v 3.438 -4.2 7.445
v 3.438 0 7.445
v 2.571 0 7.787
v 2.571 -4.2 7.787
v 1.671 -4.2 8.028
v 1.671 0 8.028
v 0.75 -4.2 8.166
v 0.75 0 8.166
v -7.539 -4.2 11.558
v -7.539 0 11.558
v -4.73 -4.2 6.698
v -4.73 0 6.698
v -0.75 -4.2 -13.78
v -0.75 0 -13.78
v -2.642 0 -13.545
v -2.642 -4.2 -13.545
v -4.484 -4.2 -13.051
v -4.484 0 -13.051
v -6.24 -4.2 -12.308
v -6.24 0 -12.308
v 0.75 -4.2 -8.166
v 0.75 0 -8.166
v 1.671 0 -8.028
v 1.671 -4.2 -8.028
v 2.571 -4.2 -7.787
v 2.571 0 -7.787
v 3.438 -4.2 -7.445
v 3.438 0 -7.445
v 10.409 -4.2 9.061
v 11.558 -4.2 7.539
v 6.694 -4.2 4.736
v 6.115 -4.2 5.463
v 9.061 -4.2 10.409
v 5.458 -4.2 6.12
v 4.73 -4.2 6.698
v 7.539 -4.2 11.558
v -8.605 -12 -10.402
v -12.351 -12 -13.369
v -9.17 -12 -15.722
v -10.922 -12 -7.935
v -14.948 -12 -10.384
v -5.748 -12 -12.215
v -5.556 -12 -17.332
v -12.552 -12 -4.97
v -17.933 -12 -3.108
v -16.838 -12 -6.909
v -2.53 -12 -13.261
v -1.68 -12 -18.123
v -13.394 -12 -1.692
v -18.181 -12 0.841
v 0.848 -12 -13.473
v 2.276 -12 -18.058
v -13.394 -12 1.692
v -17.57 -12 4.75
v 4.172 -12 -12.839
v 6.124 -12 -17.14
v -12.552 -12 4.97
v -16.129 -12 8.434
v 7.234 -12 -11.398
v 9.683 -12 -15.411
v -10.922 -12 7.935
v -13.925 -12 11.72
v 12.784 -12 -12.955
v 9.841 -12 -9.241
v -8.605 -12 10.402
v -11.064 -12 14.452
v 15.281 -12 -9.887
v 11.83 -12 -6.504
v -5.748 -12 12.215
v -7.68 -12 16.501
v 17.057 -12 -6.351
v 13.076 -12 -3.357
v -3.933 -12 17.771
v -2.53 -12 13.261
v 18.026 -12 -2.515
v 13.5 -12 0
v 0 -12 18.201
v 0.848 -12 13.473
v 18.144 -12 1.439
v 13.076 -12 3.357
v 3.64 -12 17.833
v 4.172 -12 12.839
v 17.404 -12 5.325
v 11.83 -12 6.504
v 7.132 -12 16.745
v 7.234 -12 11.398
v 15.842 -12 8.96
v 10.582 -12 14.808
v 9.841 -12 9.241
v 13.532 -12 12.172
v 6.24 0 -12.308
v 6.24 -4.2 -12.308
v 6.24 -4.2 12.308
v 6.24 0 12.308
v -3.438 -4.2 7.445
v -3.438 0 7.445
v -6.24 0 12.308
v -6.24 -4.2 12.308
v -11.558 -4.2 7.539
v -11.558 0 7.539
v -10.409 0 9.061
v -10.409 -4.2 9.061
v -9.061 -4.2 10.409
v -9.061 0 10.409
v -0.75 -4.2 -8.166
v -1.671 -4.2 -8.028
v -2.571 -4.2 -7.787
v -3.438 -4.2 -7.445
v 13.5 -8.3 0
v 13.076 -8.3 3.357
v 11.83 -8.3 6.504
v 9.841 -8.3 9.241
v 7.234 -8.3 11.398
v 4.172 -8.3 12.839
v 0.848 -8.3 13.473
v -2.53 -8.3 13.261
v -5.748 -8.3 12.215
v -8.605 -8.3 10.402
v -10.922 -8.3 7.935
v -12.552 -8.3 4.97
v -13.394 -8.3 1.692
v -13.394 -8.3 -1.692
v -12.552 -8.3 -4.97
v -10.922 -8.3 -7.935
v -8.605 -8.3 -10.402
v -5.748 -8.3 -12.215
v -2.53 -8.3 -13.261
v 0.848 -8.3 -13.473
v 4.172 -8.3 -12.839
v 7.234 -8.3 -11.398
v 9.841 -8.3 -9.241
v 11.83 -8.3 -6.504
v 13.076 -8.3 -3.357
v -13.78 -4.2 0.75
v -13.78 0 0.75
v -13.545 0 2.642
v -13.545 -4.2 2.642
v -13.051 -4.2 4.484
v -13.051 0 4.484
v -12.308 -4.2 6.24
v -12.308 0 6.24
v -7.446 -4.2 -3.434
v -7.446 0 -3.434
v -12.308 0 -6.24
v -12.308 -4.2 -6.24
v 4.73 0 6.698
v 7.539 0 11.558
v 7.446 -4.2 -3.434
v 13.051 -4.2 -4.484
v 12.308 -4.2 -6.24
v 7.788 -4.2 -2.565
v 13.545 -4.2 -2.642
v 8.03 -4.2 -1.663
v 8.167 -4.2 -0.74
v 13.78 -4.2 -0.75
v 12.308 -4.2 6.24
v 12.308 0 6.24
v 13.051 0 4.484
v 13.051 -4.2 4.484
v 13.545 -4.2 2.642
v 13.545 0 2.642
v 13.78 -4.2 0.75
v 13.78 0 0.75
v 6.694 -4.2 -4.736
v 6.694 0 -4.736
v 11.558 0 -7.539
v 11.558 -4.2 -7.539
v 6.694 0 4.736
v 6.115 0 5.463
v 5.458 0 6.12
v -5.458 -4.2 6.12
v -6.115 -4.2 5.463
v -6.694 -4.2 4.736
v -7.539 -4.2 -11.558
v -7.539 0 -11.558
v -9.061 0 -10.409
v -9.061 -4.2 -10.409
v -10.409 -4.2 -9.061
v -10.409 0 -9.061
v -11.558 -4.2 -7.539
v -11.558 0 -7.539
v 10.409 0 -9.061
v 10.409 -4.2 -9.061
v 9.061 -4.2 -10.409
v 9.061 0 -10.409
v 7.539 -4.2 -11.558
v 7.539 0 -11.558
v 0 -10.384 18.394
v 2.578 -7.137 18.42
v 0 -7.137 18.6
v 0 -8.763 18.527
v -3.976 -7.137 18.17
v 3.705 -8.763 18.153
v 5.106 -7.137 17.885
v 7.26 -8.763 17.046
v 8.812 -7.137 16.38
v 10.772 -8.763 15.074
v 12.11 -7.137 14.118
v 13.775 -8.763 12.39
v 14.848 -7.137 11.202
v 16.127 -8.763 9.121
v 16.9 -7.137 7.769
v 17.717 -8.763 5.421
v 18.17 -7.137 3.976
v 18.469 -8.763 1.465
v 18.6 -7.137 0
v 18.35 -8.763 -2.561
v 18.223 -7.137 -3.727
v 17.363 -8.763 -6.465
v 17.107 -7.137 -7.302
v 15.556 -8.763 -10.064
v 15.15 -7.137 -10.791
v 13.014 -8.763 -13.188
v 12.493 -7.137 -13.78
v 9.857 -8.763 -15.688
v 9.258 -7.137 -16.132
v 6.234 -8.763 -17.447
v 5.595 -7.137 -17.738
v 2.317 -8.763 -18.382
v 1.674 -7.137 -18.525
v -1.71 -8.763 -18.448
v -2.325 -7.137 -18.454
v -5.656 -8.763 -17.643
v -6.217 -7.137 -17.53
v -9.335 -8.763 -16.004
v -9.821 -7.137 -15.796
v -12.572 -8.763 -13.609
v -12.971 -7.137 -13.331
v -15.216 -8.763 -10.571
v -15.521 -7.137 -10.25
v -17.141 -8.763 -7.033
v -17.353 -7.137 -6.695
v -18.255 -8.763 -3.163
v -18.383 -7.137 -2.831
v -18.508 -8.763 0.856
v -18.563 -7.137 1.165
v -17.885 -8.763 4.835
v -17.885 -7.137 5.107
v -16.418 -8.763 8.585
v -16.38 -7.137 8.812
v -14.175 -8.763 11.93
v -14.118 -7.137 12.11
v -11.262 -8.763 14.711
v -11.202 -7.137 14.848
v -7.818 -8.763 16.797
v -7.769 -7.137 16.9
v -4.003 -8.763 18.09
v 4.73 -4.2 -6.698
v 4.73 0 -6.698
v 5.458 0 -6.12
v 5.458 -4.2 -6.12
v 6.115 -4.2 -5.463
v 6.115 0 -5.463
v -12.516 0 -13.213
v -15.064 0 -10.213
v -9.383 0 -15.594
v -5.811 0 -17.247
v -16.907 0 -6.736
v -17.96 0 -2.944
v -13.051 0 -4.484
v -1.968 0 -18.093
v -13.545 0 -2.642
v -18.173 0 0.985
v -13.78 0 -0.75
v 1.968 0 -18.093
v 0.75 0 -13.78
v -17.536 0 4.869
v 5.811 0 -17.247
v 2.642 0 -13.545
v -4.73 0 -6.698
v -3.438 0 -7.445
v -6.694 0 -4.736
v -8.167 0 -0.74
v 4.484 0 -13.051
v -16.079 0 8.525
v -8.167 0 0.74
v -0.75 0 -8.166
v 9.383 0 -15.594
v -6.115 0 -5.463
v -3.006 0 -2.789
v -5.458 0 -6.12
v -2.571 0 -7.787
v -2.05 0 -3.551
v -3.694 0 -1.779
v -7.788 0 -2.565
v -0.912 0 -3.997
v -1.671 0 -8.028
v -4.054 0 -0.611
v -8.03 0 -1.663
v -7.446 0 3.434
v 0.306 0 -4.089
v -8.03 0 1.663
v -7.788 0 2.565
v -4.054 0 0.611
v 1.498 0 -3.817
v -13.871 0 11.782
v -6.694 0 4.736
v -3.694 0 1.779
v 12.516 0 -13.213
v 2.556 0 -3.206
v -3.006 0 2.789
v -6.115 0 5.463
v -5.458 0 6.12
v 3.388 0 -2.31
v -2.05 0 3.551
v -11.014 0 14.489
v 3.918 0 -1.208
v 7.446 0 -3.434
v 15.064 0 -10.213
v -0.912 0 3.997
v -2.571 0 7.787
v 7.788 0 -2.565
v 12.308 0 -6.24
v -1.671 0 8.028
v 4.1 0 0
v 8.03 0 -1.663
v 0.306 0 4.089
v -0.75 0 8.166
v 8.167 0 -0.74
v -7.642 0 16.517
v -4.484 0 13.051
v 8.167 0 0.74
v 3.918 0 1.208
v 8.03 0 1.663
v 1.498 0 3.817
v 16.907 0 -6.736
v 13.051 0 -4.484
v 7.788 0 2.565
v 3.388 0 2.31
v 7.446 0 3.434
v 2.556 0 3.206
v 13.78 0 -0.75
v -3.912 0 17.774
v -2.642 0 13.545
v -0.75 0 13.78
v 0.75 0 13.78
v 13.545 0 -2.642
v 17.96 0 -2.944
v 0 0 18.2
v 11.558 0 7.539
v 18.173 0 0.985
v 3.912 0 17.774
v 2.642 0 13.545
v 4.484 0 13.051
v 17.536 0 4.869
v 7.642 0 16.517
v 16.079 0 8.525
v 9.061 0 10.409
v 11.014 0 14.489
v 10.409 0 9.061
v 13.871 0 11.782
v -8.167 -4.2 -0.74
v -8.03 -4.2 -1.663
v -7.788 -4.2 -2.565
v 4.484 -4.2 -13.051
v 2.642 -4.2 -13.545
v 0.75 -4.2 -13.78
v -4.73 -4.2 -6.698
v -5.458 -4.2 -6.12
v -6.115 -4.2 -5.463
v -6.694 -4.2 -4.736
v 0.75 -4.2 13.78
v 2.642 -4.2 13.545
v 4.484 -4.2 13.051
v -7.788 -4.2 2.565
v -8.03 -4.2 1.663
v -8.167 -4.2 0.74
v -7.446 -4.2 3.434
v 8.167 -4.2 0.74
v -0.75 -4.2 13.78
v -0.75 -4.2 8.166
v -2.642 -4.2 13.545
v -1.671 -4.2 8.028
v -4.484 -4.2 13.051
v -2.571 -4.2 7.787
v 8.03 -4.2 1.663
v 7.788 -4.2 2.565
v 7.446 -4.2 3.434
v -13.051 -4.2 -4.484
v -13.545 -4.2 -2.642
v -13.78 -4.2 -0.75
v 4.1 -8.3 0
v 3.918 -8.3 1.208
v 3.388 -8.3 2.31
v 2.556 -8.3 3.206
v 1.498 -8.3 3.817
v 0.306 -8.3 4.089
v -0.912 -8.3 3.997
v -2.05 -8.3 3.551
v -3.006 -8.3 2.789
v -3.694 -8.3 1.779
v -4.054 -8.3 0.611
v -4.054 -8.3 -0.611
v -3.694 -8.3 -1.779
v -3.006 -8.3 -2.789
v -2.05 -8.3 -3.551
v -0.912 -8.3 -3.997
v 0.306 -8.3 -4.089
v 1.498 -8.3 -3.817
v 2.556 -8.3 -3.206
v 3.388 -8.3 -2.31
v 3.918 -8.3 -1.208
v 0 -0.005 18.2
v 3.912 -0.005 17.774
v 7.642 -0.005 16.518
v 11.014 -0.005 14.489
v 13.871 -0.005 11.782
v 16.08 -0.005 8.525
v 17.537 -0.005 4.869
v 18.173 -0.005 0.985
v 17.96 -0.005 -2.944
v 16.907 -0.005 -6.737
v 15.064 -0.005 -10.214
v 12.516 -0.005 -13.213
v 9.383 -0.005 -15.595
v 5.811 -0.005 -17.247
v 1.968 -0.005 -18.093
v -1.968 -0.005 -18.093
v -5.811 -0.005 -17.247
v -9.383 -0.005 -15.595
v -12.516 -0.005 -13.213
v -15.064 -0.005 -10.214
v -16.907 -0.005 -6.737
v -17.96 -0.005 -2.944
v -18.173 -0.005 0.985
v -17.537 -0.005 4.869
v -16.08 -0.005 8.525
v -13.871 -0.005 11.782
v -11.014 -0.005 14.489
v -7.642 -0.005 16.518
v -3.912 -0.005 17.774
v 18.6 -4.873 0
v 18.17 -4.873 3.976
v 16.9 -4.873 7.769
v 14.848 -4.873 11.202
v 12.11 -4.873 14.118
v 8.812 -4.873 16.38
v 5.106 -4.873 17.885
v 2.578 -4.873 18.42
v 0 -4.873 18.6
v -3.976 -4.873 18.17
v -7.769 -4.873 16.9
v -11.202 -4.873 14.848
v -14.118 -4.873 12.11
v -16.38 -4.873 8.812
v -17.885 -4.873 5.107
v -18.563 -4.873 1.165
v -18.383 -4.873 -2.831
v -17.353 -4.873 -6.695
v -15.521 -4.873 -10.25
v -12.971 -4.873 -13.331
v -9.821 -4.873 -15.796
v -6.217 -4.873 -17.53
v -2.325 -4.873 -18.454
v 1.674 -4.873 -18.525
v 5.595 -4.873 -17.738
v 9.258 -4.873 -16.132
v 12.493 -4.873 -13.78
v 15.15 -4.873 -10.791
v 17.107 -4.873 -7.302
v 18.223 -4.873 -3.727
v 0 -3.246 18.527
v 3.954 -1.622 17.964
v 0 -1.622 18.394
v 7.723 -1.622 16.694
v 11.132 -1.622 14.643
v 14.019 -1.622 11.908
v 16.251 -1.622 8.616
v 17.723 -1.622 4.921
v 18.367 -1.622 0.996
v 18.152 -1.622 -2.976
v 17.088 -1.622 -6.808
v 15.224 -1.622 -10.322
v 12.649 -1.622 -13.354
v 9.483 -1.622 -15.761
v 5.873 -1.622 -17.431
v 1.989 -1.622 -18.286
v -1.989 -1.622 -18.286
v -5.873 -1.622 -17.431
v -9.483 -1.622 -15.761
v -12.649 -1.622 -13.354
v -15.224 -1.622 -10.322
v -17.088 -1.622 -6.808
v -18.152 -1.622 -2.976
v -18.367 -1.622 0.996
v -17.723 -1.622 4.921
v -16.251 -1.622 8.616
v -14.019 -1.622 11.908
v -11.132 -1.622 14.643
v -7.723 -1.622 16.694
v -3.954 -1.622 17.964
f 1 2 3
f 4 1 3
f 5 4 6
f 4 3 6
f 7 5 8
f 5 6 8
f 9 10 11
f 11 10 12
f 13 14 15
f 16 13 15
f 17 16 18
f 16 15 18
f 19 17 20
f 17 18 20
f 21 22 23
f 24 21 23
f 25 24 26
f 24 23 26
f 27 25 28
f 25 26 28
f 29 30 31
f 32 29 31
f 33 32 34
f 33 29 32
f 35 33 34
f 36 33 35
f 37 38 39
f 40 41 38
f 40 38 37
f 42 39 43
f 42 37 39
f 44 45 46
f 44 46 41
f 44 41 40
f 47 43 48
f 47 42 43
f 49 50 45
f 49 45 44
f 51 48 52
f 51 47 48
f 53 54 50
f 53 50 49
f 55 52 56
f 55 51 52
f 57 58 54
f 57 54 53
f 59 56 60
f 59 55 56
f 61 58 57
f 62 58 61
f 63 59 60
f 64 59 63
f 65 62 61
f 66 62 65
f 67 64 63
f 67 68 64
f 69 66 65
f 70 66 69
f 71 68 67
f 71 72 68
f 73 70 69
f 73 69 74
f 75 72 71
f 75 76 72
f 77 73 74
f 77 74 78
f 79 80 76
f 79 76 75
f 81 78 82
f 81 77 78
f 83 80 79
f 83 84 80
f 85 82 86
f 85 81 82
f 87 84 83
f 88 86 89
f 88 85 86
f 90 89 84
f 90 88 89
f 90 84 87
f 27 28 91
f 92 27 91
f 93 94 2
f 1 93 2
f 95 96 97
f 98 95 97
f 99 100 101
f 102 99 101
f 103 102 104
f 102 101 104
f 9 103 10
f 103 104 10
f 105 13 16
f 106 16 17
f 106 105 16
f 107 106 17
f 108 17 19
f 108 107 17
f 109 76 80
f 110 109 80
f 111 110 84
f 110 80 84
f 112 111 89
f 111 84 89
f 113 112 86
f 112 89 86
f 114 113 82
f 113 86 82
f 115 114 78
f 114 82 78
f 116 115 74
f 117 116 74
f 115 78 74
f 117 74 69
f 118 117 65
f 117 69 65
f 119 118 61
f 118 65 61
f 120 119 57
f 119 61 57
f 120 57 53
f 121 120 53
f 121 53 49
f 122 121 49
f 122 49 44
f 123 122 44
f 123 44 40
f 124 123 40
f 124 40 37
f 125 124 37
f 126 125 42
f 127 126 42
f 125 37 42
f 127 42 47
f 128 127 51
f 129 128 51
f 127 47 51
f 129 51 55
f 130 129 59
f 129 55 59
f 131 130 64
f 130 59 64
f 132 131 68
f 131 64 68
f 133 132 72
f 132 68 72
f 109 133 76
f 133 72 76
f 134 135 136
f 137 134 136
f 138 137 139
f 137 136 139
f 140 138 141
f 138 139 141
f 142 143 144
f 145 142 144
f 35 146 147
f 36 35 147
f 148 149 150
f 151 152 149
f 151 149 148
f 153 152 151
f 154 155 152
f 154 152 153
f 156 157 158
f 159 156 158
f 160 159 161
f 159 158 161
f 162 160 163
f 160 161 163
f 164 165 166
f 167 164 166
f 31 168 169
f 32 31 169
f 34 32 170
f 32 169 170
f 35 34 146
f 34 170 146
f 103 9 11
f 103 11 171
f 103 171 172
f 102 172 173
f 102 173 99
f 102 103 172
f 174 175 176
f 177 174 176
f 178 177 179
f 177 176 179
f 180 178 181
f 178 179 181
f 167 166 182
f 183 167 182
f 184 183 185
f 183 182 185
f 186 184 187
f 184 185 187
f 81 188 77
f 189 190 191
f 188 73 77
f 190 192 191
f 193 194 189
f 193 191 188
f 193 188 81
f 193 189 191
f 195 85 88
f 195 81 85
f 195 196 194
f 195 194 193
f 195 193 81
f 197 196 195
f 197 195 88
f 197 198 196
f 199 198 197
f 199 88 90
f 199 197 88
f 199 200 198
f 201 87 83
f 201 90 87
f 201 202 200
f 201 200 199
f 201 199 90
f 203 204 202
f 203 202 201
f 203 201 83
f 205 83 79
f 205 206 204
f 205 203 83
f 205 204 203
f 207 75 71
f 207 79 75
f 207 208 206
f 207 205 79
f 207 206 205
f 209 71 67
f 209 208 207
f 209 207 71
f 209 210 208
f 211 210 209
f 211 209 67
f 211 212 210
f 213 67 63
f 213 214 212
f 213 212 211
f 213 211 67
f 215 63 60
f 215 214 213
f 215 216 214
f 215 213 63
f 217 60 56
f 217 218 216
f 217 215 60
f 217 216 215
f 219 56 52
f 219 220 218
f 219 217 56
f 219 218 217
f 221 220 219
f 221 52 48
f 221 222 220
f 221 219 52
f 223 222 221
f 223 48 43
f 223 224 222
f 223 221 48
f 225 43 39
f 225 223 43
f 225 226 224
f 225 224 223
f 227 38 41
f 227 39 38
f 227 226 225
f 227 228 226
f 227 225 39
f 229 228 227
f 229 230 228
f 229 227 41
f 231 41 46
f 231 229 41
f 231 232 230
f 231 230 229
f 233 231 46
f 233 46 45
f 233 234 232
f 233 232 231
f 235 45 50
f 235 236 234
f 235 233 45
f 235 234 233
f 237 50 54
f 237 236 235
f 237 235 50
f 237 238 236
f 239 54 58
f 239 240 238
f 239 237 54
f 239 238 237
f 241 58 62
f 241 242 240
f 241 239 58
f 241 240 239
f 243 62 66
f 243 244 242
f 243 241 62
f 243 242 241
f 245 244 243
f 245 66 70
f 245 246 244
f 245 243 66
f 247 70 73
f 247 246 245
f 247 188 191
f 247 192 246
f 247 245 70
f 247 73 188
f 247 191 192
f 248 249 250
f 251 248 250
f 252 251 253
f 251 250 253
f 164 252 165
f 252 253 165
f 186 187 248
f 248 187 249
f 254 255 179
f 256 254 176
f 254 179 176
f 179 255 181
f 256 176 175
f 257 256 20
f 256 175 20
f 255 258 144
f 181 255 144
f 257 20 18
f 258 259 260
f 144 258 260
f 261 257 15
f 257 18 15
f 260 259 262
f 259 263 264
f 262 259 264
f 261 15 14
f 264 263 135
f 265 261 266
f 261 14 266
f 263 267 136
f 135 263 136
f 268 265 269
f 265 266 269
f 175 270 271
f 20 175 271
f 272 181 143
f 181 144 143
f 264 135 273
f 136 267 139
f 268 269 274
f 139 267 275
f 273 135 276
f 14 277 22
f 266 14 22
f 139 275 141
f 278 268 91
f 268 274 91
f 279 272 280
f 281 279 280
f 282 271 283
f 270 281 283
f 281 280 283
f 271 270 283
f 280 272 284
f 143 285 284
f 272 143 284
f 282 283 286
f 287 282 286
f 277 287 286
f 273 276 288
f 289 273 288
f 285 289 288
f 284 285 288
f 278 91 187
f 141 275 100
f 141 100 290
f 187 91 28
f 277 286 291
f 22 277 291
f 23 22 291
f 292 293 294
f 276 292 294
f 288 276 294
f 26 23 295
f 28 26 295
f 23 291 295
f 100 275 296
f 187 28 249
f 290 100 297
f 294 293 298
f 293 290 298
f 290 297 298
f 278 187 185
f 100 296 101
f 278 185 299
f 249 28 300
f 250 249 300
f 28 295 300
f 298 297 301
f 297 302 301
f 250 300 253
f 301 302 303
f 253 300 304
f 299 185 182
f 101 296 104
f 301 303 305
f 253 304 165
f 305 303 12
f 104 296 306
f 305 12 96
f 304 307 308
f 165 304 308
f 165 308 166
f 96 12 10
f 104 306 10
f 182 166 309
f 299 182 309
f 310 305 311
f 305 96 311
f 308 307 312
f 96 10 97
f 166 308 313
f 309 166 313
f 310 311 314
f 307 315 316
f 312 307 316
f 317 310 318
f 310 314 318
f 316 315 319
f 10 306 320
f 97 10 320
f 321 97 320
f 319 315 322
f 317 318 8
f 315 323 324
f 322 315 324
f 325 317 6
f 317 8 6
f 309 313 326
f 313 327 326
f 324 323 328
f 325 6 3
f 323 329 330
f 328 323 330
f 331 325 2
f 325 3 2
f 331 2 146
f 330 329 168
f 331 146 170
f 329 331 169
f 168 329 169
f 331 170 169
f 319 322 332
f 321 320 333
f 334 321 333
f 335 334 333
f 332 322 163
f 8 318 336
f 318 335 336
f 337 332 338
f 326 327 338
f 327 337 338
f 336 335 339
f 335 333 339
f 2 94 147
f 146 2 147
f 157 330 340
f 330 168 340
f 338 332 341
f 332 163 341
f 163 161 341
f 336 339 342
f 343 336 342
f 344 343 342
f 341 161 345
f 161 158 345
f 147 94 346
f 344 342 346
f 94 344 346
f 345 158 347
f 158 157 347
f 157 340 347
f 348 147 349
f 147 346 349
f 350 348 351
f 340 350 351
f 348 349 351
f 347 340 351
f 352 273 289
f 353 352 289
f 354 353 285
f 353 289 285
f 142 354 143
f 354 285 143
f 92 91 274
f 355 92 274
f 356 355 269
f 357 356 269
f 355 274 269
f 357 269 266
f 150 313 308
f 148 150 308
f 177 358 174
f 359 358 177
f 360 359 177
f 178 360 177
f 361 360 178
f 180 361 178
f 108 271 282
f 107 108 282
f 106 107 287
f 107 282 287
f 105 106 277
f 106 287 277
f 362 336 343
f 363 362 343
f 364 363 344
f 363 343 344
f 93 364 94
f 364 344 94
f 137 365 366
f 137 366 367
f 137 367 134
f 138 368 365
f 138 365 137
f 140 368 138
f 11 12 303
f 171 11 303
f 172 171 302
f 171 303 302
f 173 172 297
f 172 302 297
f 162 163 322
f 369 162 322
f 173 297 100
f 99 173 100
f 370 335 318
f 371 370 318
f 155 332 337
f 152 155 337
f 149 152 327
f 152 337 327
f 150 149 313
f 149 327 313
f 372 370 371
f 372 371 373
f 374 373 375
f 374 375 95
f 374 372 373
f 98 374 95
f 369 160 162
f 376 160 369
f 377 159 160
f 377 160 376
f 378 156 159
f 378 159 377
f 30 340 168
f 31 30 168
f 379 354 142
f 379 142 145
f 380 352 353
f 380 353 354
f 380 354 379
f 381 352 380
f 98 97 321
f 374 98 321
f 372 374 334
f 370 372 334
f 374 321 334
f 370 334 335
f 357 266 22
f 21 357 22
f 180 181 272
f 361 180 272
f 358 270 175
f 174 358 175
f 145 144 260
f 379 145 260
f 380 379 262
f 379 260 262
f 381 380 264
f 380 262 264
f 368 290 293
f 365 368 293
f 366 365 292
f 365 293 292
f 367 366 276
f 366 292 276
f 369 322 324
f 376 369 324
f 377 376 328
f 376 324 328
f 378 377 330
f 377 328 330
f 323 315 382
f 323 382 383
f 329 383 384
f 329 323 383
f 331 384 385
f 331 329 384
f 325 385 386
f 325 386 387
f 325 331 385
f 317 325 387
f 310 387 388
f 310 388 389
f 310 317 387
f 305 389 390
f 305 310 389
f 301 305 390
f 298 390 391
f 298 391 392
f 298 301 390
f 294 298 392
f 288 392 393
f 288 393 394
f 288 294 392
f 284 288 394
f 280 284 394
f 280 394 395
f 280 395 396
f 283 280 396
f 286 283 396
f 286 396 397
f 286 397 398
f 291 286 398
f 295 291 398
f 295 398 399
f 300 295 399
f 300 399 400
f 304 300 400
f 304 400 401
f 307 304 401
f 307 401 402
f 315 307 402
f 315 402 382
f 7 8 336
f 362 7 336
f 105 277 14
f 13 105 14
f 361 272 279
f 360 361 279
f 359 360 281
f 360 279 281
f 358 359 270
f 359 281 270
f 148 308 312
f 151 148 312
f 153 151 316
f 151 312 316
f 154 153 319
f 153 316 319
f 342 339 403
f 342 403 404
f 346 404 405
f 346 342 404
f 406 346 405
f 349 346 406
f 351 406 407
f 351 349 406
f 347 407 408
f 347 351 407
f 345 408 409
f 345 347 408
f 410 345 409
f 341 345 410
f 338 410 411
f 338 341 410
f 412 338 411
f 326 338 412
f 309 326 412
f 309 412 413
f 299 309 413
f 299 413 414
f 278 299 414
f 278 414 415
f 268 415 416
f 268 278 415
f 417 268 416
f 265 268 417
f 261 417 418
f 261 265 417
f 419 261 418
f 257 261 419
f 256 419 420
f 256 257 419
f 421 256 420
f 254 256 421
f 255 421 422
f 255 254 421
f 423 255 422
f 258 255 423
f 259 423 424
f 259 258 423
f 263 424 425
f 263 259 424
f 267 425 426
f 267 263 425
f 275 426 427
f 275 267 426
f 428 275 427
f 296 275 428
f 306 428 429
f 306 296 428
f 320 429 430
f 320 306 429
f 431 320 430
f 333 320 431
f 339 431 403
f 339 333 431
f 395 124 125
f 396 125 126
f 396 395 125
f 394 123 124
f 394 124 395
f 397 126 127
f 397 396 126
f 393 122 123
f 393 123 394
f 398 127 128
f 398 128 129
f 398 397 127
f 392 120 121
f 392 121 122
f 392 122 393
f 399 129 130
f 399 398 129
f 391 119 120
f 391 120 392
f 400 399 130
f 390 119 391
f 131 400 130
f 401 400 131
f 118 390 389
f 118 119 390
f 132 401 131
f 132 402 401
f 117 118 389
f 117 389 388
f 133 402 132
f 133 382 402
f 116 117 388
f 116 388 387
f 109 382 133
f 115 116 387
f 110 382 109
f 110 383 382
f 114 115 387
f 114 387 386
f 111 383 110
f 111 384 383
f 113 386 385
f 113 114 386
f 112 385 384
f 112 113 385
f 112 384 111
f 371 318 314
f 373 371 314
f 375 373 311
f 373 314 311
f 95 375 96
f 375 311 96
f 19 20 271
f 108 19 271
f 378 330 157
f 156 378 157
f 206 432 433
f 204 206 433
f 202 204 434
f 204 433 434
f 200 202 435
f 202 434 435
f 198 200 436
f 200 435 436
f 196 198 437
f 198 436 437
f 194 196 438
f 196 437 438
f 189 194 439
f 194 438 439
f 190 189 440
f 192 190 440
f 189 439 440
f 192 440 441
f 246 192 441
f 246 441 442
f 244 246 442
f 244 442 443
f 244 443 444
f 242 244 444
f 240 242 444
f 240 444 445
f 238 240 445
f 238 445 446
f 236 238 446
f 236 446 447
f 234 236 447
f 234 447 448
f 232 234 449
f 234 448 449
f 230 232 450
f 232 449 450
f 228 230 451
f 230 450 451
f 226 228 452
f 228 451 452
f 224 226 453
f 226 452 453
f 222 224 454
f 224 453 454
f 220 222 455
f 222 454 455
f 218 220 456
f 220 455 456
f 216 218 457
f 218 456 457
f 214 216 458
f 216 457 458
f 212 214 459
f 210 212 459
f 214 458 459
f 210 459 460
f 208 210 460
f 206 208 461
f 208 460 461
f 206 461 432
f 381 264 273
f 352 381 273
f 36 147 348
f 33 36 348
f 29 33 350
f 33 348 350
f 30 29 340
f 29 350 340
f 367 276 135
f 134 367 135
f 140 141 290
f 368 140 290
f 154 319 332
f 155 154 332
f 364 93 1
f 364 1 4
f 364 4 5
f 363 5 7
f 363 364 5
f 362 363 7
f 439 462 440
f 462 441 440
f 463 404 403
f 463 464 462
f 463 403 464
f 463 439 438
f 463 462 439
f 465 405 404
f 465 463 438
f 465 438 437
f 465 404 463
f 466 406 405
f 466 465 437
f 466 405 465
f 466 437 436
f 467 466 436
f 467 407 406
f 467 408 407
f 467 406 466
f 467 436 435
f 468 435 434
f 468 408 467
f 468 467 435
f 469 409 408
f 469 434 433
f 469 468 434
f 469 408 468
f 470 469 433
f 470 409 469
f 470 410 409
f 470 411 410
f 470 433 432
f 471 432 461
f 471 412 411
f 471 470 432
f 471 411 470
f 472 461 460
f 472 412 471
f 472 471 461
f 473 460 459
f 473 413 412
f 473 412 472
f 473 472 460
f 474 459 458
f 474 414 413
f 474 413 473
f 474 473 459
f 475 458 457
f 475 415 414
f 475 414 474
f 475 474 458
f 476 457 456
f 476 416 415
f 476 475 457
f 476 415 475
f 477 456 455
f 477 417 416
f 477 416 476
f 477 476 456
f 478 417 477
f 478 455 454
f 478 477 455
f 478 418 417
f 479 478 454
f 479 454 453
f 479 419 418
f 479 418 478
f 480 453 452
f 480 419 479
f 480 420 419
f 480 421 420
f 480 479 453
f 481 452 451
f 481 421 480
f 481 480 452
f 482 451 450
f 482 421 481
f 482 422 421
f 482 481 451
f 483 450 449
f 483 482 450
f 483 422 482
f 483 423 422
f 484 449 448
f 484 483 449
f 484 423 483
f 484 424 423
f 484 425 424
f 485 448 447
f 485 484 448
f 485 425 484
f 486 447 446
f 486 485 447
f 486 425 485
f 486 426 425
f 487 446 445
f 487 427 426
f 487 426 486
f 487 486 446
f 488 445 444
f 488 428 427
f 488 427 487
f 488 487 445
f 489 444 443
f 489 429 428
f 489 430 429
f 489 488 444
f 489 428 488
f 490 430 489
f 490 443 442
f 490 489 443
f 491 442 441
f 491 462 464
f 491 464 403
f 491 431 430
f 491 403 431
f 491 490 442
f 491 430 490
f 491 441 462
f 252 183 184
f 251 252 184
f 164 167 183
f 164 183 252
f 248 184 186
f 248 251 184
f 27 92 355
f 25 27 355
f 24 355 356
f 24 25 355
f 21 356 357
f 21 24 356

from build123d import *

# Parameters (mm, degrees)
F0_R     = 18.6
F0_R_2   = 4.1
F1_DEPTH = 12
F2_R     = 13.5
F2_R_2   = 4.1
F3_DEPTH = 3.7
F5_DEPTH = 4.2


# Not quite as in the source:
# - ends of sketch curves that miss each other by under 0.0002 mm in the source are joined


with BuildPart() as f1:
    # F0 (on Front) → F1 (new body)
    with BuildSketch(Plane.XZ):
        Circle(F0_R)
        Circle(F0_R_2, mode=Mode.SUBTRACT)
    extrude(amount=F1_DEPTH)

    # F2 (on face) → F3 (cut)
    with BuildSketch(Plane.XZ.offset(12)):
        Circle(F2_R)
        Circle(F2_R_2, mode=Mode.SUBTRACT)
    extrude(amount=-F3_DEPTH, mode=Mode.SUBTRACT)

    # F4 (on face) → F5 (cut)
    with BuildSketch(Plane(origin=(0, 0, 0), x_dir=(-1, 0, 0), z_dir=(0, 1, 0))):
        with BuildLine():
            Line((-7.4463871349, 3.4338489537), (-12.3084865507, 6.2402851562))
            ThreePointArc((-12.3084865507, 6.2402851562), (-13.3297808283, 3.5716863063), (-13.7796064717, 0.7499636563))
            Line((-13.7796064717, 0.7499636563), (-8.1665450744, 0.7399605041))
            ThreePointArc((-8.1665450744, 0.7399605041), (-7.9218161925, 2.1177412996), (-7.4463871349, 3.4338489537))
        make_face()
        with BuildLine():
            Line((-0.75, 8.1656291858), (-0.75, 13.7796044936))
            ThreePointArc((-0.75, 13.7796044936), (-3.5717111631, 13.3297741679), (-6.2402985973, 12.3084797362))
            Line((-6.2402985973, 12.3084797362), (-3.4376390894, 7.4446381706))
            ThreePointArc((-3.4376390894, 7.4446381706), (-2.1246263899, 7.9199723928), (-0.75, 8.1656291858))
        make_face()
        with BuildLine():
            ThreePointArc((6.2402985973, 12.3084797362), (3.5717111631, 13.3297741679), (0.75, 13.7796044936))
            Line((0.75, 13.7796044936), (0.75, 8.1656291858))
            ThreePointArc((0.75, 8.1656291858), (2.1246263899, 7.9199723928), (3.4376390894, 7.4446381706))
            Line((3.4376390894, 7.4446381706), (6.2402985973, 12.3084797362))
        make_face()
        with BuildLine():
            Line((7.5393145037, 11.5584919784), (4.7304979814, 6.6979391493))
            ThreePointArc((4.7304979814, 6.6979391493), (5.7956887156, 5.8008613423), (6.6937164195, 4.7364713126))
            Line((6.6937164195, 4.7364713126), (11.5584775515, 7.5393366214))
            ThreePointArc((11.5584775515, 7.5393366214), (9.7580642441, 9.7580829166), (7.5393145037, 11.5584919784))
        make_face()
        with BuildLine():
            Line((12.3084865507, 6.2402851562), (7.4463871349, 3.4338489537))
            ThreePointArc((7.4463871349, 3.4338489537), (7.9218161925, 2.1177412996), (8.1665450744, 0.7399605041))
            Line((8.1665450744, 0.7399605041), (13.7796064717, 0.7499636563))
            ThreePointArc((13.7796064717, 0.7499636563), (13.3297808283, 3.5716863063), (12.3084865507, 6.2402851562))
        make_face()
        with BuildLine():
            ThreePointArc((-6.6937164195, 4.7364713126), (-5.7956887156, 5.8008613423), (-4.7304979814, 6.6979391493))
            Line((-4.7304979814, 6.6979391493), (-7.5393145037, 11.5584919784))
            ThreePointArc((-7.5393145037, 11.5584919784), (-9.7580642441, 9.7580829166), (-11.5584775515, 7.5393366214))
            Line((-11.5584775515, 7.5393366214), (-6.6937164195, 4.7364713126))
        make_face()
        with BuildLine():
            Line((-8.1665450744, -0.7399605041), (-13.7796064717, -0.7499636563))
            ThreePointArc((-13.7796064717, -0.7499636563), (-13.3297808283, -3.5716863063), (-12.3084865507, -6.2402851562))
            Line((-12.3084865507, -6.2402851562), (-7.4463871349, -3.4338489537))
            ThreePointArc((-7.4463871349, -3.4338489537), (-7.9218161925, -2.1177412996), (-8.1665450744, -0.7399605041))
        make_face()
        with BuildLine():
            ThreePointArc((-4.7304979814, -6.6979391493), (-5.7956887156, -5.8008613423), (-6.6937164195, -4.7364713126))
            Line((-6.6937164195, -4.7364713126), (-11.5584775515, -7.5393366214))
            ThreePointArc((-11.5584775515, -7.5393366214), (-9.7580642441, -9.7580829166), (-7.5393145037, -11.5584919784))
            Line((-7.5393145037, -11.5584919784), (-4.7304979814, -6.6979391493))
        make_face()
        with BuildLine():
            ThreePointArc((-0.75, -8.1656291858), (-2.1246263899, -7.9199723928), (-3.4376390894, -7.4446381706))
            Line((-3.4376390894, -7.4446381706), (-6.2402985973, -12.3084797362))
            ThreePointArc((-6.2402985973, -12.3084797362), (-3.5717111631, -13.3297741679), (-0.75, -13.7796044936))
            Line((-0.75, -13.7796044936), (-0.75, -8.1656291858))
        make_face()
        with BuildLine():
            Line((0.75, -8.1656291858), (0.75, -13.7796044936))
            ThreePointArc((0.75, -13.7796044936), (3.5717111631, -13.3297741679), (6.2402985973, -12.3084797362))
            Line((6.2402985973, -12.3084797362), (3.4376390894, -7.4446381706))
            ThreePointArc((3.4376390894, -7.4446381706), (2.1246263899, -7.9199723928), (0.75, -8.1656291858))
        make_face()
        with BuildLine():
            ThreePointArc((6.6937164195, -4.7364713126), (5.7956887156, -5.8008613423), (4.7304979814, -6.6979391493))
            Line((4.7304979814, -6.6979391493), (7.5393145037, -11.5584919784))
            ThreePointArc((7.5393145037, -11.5584919784), (9.7580642441, -9.7580829166), (11.5584775515, -7.5393366214))
            Line((11.5584775515, -7.5393366214), (6.6937164195, -4.7364713126))
        make_face()
        with BuildLine():
            ThreePointArc((8.1665450744, -0.7399605041), (7.9218161925, -2.1177412996), (7.4463871349, -3.4338489537))
            Line((7.4463871349, -3.4338489537), (12.3084865507, -6.2402851562))
            ThreePointArc((12.3084865507, -6.2402851562), (13.3297761181, -3.5717038849), (13.7796044936, -0.75))
            Line((13.7796044936, -0.75), (8.1665450744, -0.7399605041))
        make_face()
    extrude(amount=-F5_DEPTH, mode=Mode.SUBTRACT)

    # F6 (on Right) → F7 (revolve, cut)
    with BuildSketch(Plane.YZ):
        with BuildLine():
            ThreePointArc((-12.0048904791, 18.2), (-6.0048904791, 18.6146934366), (-0.0048904791, 18.2))
            Line((-0.0048904791, 18.2), (0.3708341392, 18.1622945595))
            Line((0.3708341392, 18.1622945595), (0.3708341392, 18.6))
            Line((0.3708341392, 18.6), (0.3567633394, 19.1855213957))
            Line((0.3567633394, 19.1855213957), (-12.2980514625, 19.1855213957))
            Line((-12.2980514625, 19.1855213957), (-12.27635841, 18.5901094228))
            Line((-12.27635841, 18.5901094228), (-12.27635841, 18.1622945595))
            Line((-12.27635841, 18.1622945595), (-12.0048904791, 18.2))
        make_face()
    revolve(axis=Axis((0, -2.5395685887, 0), (0, 1, 0)), mode=Mode.SUBTRACT)


solid = f1.part
